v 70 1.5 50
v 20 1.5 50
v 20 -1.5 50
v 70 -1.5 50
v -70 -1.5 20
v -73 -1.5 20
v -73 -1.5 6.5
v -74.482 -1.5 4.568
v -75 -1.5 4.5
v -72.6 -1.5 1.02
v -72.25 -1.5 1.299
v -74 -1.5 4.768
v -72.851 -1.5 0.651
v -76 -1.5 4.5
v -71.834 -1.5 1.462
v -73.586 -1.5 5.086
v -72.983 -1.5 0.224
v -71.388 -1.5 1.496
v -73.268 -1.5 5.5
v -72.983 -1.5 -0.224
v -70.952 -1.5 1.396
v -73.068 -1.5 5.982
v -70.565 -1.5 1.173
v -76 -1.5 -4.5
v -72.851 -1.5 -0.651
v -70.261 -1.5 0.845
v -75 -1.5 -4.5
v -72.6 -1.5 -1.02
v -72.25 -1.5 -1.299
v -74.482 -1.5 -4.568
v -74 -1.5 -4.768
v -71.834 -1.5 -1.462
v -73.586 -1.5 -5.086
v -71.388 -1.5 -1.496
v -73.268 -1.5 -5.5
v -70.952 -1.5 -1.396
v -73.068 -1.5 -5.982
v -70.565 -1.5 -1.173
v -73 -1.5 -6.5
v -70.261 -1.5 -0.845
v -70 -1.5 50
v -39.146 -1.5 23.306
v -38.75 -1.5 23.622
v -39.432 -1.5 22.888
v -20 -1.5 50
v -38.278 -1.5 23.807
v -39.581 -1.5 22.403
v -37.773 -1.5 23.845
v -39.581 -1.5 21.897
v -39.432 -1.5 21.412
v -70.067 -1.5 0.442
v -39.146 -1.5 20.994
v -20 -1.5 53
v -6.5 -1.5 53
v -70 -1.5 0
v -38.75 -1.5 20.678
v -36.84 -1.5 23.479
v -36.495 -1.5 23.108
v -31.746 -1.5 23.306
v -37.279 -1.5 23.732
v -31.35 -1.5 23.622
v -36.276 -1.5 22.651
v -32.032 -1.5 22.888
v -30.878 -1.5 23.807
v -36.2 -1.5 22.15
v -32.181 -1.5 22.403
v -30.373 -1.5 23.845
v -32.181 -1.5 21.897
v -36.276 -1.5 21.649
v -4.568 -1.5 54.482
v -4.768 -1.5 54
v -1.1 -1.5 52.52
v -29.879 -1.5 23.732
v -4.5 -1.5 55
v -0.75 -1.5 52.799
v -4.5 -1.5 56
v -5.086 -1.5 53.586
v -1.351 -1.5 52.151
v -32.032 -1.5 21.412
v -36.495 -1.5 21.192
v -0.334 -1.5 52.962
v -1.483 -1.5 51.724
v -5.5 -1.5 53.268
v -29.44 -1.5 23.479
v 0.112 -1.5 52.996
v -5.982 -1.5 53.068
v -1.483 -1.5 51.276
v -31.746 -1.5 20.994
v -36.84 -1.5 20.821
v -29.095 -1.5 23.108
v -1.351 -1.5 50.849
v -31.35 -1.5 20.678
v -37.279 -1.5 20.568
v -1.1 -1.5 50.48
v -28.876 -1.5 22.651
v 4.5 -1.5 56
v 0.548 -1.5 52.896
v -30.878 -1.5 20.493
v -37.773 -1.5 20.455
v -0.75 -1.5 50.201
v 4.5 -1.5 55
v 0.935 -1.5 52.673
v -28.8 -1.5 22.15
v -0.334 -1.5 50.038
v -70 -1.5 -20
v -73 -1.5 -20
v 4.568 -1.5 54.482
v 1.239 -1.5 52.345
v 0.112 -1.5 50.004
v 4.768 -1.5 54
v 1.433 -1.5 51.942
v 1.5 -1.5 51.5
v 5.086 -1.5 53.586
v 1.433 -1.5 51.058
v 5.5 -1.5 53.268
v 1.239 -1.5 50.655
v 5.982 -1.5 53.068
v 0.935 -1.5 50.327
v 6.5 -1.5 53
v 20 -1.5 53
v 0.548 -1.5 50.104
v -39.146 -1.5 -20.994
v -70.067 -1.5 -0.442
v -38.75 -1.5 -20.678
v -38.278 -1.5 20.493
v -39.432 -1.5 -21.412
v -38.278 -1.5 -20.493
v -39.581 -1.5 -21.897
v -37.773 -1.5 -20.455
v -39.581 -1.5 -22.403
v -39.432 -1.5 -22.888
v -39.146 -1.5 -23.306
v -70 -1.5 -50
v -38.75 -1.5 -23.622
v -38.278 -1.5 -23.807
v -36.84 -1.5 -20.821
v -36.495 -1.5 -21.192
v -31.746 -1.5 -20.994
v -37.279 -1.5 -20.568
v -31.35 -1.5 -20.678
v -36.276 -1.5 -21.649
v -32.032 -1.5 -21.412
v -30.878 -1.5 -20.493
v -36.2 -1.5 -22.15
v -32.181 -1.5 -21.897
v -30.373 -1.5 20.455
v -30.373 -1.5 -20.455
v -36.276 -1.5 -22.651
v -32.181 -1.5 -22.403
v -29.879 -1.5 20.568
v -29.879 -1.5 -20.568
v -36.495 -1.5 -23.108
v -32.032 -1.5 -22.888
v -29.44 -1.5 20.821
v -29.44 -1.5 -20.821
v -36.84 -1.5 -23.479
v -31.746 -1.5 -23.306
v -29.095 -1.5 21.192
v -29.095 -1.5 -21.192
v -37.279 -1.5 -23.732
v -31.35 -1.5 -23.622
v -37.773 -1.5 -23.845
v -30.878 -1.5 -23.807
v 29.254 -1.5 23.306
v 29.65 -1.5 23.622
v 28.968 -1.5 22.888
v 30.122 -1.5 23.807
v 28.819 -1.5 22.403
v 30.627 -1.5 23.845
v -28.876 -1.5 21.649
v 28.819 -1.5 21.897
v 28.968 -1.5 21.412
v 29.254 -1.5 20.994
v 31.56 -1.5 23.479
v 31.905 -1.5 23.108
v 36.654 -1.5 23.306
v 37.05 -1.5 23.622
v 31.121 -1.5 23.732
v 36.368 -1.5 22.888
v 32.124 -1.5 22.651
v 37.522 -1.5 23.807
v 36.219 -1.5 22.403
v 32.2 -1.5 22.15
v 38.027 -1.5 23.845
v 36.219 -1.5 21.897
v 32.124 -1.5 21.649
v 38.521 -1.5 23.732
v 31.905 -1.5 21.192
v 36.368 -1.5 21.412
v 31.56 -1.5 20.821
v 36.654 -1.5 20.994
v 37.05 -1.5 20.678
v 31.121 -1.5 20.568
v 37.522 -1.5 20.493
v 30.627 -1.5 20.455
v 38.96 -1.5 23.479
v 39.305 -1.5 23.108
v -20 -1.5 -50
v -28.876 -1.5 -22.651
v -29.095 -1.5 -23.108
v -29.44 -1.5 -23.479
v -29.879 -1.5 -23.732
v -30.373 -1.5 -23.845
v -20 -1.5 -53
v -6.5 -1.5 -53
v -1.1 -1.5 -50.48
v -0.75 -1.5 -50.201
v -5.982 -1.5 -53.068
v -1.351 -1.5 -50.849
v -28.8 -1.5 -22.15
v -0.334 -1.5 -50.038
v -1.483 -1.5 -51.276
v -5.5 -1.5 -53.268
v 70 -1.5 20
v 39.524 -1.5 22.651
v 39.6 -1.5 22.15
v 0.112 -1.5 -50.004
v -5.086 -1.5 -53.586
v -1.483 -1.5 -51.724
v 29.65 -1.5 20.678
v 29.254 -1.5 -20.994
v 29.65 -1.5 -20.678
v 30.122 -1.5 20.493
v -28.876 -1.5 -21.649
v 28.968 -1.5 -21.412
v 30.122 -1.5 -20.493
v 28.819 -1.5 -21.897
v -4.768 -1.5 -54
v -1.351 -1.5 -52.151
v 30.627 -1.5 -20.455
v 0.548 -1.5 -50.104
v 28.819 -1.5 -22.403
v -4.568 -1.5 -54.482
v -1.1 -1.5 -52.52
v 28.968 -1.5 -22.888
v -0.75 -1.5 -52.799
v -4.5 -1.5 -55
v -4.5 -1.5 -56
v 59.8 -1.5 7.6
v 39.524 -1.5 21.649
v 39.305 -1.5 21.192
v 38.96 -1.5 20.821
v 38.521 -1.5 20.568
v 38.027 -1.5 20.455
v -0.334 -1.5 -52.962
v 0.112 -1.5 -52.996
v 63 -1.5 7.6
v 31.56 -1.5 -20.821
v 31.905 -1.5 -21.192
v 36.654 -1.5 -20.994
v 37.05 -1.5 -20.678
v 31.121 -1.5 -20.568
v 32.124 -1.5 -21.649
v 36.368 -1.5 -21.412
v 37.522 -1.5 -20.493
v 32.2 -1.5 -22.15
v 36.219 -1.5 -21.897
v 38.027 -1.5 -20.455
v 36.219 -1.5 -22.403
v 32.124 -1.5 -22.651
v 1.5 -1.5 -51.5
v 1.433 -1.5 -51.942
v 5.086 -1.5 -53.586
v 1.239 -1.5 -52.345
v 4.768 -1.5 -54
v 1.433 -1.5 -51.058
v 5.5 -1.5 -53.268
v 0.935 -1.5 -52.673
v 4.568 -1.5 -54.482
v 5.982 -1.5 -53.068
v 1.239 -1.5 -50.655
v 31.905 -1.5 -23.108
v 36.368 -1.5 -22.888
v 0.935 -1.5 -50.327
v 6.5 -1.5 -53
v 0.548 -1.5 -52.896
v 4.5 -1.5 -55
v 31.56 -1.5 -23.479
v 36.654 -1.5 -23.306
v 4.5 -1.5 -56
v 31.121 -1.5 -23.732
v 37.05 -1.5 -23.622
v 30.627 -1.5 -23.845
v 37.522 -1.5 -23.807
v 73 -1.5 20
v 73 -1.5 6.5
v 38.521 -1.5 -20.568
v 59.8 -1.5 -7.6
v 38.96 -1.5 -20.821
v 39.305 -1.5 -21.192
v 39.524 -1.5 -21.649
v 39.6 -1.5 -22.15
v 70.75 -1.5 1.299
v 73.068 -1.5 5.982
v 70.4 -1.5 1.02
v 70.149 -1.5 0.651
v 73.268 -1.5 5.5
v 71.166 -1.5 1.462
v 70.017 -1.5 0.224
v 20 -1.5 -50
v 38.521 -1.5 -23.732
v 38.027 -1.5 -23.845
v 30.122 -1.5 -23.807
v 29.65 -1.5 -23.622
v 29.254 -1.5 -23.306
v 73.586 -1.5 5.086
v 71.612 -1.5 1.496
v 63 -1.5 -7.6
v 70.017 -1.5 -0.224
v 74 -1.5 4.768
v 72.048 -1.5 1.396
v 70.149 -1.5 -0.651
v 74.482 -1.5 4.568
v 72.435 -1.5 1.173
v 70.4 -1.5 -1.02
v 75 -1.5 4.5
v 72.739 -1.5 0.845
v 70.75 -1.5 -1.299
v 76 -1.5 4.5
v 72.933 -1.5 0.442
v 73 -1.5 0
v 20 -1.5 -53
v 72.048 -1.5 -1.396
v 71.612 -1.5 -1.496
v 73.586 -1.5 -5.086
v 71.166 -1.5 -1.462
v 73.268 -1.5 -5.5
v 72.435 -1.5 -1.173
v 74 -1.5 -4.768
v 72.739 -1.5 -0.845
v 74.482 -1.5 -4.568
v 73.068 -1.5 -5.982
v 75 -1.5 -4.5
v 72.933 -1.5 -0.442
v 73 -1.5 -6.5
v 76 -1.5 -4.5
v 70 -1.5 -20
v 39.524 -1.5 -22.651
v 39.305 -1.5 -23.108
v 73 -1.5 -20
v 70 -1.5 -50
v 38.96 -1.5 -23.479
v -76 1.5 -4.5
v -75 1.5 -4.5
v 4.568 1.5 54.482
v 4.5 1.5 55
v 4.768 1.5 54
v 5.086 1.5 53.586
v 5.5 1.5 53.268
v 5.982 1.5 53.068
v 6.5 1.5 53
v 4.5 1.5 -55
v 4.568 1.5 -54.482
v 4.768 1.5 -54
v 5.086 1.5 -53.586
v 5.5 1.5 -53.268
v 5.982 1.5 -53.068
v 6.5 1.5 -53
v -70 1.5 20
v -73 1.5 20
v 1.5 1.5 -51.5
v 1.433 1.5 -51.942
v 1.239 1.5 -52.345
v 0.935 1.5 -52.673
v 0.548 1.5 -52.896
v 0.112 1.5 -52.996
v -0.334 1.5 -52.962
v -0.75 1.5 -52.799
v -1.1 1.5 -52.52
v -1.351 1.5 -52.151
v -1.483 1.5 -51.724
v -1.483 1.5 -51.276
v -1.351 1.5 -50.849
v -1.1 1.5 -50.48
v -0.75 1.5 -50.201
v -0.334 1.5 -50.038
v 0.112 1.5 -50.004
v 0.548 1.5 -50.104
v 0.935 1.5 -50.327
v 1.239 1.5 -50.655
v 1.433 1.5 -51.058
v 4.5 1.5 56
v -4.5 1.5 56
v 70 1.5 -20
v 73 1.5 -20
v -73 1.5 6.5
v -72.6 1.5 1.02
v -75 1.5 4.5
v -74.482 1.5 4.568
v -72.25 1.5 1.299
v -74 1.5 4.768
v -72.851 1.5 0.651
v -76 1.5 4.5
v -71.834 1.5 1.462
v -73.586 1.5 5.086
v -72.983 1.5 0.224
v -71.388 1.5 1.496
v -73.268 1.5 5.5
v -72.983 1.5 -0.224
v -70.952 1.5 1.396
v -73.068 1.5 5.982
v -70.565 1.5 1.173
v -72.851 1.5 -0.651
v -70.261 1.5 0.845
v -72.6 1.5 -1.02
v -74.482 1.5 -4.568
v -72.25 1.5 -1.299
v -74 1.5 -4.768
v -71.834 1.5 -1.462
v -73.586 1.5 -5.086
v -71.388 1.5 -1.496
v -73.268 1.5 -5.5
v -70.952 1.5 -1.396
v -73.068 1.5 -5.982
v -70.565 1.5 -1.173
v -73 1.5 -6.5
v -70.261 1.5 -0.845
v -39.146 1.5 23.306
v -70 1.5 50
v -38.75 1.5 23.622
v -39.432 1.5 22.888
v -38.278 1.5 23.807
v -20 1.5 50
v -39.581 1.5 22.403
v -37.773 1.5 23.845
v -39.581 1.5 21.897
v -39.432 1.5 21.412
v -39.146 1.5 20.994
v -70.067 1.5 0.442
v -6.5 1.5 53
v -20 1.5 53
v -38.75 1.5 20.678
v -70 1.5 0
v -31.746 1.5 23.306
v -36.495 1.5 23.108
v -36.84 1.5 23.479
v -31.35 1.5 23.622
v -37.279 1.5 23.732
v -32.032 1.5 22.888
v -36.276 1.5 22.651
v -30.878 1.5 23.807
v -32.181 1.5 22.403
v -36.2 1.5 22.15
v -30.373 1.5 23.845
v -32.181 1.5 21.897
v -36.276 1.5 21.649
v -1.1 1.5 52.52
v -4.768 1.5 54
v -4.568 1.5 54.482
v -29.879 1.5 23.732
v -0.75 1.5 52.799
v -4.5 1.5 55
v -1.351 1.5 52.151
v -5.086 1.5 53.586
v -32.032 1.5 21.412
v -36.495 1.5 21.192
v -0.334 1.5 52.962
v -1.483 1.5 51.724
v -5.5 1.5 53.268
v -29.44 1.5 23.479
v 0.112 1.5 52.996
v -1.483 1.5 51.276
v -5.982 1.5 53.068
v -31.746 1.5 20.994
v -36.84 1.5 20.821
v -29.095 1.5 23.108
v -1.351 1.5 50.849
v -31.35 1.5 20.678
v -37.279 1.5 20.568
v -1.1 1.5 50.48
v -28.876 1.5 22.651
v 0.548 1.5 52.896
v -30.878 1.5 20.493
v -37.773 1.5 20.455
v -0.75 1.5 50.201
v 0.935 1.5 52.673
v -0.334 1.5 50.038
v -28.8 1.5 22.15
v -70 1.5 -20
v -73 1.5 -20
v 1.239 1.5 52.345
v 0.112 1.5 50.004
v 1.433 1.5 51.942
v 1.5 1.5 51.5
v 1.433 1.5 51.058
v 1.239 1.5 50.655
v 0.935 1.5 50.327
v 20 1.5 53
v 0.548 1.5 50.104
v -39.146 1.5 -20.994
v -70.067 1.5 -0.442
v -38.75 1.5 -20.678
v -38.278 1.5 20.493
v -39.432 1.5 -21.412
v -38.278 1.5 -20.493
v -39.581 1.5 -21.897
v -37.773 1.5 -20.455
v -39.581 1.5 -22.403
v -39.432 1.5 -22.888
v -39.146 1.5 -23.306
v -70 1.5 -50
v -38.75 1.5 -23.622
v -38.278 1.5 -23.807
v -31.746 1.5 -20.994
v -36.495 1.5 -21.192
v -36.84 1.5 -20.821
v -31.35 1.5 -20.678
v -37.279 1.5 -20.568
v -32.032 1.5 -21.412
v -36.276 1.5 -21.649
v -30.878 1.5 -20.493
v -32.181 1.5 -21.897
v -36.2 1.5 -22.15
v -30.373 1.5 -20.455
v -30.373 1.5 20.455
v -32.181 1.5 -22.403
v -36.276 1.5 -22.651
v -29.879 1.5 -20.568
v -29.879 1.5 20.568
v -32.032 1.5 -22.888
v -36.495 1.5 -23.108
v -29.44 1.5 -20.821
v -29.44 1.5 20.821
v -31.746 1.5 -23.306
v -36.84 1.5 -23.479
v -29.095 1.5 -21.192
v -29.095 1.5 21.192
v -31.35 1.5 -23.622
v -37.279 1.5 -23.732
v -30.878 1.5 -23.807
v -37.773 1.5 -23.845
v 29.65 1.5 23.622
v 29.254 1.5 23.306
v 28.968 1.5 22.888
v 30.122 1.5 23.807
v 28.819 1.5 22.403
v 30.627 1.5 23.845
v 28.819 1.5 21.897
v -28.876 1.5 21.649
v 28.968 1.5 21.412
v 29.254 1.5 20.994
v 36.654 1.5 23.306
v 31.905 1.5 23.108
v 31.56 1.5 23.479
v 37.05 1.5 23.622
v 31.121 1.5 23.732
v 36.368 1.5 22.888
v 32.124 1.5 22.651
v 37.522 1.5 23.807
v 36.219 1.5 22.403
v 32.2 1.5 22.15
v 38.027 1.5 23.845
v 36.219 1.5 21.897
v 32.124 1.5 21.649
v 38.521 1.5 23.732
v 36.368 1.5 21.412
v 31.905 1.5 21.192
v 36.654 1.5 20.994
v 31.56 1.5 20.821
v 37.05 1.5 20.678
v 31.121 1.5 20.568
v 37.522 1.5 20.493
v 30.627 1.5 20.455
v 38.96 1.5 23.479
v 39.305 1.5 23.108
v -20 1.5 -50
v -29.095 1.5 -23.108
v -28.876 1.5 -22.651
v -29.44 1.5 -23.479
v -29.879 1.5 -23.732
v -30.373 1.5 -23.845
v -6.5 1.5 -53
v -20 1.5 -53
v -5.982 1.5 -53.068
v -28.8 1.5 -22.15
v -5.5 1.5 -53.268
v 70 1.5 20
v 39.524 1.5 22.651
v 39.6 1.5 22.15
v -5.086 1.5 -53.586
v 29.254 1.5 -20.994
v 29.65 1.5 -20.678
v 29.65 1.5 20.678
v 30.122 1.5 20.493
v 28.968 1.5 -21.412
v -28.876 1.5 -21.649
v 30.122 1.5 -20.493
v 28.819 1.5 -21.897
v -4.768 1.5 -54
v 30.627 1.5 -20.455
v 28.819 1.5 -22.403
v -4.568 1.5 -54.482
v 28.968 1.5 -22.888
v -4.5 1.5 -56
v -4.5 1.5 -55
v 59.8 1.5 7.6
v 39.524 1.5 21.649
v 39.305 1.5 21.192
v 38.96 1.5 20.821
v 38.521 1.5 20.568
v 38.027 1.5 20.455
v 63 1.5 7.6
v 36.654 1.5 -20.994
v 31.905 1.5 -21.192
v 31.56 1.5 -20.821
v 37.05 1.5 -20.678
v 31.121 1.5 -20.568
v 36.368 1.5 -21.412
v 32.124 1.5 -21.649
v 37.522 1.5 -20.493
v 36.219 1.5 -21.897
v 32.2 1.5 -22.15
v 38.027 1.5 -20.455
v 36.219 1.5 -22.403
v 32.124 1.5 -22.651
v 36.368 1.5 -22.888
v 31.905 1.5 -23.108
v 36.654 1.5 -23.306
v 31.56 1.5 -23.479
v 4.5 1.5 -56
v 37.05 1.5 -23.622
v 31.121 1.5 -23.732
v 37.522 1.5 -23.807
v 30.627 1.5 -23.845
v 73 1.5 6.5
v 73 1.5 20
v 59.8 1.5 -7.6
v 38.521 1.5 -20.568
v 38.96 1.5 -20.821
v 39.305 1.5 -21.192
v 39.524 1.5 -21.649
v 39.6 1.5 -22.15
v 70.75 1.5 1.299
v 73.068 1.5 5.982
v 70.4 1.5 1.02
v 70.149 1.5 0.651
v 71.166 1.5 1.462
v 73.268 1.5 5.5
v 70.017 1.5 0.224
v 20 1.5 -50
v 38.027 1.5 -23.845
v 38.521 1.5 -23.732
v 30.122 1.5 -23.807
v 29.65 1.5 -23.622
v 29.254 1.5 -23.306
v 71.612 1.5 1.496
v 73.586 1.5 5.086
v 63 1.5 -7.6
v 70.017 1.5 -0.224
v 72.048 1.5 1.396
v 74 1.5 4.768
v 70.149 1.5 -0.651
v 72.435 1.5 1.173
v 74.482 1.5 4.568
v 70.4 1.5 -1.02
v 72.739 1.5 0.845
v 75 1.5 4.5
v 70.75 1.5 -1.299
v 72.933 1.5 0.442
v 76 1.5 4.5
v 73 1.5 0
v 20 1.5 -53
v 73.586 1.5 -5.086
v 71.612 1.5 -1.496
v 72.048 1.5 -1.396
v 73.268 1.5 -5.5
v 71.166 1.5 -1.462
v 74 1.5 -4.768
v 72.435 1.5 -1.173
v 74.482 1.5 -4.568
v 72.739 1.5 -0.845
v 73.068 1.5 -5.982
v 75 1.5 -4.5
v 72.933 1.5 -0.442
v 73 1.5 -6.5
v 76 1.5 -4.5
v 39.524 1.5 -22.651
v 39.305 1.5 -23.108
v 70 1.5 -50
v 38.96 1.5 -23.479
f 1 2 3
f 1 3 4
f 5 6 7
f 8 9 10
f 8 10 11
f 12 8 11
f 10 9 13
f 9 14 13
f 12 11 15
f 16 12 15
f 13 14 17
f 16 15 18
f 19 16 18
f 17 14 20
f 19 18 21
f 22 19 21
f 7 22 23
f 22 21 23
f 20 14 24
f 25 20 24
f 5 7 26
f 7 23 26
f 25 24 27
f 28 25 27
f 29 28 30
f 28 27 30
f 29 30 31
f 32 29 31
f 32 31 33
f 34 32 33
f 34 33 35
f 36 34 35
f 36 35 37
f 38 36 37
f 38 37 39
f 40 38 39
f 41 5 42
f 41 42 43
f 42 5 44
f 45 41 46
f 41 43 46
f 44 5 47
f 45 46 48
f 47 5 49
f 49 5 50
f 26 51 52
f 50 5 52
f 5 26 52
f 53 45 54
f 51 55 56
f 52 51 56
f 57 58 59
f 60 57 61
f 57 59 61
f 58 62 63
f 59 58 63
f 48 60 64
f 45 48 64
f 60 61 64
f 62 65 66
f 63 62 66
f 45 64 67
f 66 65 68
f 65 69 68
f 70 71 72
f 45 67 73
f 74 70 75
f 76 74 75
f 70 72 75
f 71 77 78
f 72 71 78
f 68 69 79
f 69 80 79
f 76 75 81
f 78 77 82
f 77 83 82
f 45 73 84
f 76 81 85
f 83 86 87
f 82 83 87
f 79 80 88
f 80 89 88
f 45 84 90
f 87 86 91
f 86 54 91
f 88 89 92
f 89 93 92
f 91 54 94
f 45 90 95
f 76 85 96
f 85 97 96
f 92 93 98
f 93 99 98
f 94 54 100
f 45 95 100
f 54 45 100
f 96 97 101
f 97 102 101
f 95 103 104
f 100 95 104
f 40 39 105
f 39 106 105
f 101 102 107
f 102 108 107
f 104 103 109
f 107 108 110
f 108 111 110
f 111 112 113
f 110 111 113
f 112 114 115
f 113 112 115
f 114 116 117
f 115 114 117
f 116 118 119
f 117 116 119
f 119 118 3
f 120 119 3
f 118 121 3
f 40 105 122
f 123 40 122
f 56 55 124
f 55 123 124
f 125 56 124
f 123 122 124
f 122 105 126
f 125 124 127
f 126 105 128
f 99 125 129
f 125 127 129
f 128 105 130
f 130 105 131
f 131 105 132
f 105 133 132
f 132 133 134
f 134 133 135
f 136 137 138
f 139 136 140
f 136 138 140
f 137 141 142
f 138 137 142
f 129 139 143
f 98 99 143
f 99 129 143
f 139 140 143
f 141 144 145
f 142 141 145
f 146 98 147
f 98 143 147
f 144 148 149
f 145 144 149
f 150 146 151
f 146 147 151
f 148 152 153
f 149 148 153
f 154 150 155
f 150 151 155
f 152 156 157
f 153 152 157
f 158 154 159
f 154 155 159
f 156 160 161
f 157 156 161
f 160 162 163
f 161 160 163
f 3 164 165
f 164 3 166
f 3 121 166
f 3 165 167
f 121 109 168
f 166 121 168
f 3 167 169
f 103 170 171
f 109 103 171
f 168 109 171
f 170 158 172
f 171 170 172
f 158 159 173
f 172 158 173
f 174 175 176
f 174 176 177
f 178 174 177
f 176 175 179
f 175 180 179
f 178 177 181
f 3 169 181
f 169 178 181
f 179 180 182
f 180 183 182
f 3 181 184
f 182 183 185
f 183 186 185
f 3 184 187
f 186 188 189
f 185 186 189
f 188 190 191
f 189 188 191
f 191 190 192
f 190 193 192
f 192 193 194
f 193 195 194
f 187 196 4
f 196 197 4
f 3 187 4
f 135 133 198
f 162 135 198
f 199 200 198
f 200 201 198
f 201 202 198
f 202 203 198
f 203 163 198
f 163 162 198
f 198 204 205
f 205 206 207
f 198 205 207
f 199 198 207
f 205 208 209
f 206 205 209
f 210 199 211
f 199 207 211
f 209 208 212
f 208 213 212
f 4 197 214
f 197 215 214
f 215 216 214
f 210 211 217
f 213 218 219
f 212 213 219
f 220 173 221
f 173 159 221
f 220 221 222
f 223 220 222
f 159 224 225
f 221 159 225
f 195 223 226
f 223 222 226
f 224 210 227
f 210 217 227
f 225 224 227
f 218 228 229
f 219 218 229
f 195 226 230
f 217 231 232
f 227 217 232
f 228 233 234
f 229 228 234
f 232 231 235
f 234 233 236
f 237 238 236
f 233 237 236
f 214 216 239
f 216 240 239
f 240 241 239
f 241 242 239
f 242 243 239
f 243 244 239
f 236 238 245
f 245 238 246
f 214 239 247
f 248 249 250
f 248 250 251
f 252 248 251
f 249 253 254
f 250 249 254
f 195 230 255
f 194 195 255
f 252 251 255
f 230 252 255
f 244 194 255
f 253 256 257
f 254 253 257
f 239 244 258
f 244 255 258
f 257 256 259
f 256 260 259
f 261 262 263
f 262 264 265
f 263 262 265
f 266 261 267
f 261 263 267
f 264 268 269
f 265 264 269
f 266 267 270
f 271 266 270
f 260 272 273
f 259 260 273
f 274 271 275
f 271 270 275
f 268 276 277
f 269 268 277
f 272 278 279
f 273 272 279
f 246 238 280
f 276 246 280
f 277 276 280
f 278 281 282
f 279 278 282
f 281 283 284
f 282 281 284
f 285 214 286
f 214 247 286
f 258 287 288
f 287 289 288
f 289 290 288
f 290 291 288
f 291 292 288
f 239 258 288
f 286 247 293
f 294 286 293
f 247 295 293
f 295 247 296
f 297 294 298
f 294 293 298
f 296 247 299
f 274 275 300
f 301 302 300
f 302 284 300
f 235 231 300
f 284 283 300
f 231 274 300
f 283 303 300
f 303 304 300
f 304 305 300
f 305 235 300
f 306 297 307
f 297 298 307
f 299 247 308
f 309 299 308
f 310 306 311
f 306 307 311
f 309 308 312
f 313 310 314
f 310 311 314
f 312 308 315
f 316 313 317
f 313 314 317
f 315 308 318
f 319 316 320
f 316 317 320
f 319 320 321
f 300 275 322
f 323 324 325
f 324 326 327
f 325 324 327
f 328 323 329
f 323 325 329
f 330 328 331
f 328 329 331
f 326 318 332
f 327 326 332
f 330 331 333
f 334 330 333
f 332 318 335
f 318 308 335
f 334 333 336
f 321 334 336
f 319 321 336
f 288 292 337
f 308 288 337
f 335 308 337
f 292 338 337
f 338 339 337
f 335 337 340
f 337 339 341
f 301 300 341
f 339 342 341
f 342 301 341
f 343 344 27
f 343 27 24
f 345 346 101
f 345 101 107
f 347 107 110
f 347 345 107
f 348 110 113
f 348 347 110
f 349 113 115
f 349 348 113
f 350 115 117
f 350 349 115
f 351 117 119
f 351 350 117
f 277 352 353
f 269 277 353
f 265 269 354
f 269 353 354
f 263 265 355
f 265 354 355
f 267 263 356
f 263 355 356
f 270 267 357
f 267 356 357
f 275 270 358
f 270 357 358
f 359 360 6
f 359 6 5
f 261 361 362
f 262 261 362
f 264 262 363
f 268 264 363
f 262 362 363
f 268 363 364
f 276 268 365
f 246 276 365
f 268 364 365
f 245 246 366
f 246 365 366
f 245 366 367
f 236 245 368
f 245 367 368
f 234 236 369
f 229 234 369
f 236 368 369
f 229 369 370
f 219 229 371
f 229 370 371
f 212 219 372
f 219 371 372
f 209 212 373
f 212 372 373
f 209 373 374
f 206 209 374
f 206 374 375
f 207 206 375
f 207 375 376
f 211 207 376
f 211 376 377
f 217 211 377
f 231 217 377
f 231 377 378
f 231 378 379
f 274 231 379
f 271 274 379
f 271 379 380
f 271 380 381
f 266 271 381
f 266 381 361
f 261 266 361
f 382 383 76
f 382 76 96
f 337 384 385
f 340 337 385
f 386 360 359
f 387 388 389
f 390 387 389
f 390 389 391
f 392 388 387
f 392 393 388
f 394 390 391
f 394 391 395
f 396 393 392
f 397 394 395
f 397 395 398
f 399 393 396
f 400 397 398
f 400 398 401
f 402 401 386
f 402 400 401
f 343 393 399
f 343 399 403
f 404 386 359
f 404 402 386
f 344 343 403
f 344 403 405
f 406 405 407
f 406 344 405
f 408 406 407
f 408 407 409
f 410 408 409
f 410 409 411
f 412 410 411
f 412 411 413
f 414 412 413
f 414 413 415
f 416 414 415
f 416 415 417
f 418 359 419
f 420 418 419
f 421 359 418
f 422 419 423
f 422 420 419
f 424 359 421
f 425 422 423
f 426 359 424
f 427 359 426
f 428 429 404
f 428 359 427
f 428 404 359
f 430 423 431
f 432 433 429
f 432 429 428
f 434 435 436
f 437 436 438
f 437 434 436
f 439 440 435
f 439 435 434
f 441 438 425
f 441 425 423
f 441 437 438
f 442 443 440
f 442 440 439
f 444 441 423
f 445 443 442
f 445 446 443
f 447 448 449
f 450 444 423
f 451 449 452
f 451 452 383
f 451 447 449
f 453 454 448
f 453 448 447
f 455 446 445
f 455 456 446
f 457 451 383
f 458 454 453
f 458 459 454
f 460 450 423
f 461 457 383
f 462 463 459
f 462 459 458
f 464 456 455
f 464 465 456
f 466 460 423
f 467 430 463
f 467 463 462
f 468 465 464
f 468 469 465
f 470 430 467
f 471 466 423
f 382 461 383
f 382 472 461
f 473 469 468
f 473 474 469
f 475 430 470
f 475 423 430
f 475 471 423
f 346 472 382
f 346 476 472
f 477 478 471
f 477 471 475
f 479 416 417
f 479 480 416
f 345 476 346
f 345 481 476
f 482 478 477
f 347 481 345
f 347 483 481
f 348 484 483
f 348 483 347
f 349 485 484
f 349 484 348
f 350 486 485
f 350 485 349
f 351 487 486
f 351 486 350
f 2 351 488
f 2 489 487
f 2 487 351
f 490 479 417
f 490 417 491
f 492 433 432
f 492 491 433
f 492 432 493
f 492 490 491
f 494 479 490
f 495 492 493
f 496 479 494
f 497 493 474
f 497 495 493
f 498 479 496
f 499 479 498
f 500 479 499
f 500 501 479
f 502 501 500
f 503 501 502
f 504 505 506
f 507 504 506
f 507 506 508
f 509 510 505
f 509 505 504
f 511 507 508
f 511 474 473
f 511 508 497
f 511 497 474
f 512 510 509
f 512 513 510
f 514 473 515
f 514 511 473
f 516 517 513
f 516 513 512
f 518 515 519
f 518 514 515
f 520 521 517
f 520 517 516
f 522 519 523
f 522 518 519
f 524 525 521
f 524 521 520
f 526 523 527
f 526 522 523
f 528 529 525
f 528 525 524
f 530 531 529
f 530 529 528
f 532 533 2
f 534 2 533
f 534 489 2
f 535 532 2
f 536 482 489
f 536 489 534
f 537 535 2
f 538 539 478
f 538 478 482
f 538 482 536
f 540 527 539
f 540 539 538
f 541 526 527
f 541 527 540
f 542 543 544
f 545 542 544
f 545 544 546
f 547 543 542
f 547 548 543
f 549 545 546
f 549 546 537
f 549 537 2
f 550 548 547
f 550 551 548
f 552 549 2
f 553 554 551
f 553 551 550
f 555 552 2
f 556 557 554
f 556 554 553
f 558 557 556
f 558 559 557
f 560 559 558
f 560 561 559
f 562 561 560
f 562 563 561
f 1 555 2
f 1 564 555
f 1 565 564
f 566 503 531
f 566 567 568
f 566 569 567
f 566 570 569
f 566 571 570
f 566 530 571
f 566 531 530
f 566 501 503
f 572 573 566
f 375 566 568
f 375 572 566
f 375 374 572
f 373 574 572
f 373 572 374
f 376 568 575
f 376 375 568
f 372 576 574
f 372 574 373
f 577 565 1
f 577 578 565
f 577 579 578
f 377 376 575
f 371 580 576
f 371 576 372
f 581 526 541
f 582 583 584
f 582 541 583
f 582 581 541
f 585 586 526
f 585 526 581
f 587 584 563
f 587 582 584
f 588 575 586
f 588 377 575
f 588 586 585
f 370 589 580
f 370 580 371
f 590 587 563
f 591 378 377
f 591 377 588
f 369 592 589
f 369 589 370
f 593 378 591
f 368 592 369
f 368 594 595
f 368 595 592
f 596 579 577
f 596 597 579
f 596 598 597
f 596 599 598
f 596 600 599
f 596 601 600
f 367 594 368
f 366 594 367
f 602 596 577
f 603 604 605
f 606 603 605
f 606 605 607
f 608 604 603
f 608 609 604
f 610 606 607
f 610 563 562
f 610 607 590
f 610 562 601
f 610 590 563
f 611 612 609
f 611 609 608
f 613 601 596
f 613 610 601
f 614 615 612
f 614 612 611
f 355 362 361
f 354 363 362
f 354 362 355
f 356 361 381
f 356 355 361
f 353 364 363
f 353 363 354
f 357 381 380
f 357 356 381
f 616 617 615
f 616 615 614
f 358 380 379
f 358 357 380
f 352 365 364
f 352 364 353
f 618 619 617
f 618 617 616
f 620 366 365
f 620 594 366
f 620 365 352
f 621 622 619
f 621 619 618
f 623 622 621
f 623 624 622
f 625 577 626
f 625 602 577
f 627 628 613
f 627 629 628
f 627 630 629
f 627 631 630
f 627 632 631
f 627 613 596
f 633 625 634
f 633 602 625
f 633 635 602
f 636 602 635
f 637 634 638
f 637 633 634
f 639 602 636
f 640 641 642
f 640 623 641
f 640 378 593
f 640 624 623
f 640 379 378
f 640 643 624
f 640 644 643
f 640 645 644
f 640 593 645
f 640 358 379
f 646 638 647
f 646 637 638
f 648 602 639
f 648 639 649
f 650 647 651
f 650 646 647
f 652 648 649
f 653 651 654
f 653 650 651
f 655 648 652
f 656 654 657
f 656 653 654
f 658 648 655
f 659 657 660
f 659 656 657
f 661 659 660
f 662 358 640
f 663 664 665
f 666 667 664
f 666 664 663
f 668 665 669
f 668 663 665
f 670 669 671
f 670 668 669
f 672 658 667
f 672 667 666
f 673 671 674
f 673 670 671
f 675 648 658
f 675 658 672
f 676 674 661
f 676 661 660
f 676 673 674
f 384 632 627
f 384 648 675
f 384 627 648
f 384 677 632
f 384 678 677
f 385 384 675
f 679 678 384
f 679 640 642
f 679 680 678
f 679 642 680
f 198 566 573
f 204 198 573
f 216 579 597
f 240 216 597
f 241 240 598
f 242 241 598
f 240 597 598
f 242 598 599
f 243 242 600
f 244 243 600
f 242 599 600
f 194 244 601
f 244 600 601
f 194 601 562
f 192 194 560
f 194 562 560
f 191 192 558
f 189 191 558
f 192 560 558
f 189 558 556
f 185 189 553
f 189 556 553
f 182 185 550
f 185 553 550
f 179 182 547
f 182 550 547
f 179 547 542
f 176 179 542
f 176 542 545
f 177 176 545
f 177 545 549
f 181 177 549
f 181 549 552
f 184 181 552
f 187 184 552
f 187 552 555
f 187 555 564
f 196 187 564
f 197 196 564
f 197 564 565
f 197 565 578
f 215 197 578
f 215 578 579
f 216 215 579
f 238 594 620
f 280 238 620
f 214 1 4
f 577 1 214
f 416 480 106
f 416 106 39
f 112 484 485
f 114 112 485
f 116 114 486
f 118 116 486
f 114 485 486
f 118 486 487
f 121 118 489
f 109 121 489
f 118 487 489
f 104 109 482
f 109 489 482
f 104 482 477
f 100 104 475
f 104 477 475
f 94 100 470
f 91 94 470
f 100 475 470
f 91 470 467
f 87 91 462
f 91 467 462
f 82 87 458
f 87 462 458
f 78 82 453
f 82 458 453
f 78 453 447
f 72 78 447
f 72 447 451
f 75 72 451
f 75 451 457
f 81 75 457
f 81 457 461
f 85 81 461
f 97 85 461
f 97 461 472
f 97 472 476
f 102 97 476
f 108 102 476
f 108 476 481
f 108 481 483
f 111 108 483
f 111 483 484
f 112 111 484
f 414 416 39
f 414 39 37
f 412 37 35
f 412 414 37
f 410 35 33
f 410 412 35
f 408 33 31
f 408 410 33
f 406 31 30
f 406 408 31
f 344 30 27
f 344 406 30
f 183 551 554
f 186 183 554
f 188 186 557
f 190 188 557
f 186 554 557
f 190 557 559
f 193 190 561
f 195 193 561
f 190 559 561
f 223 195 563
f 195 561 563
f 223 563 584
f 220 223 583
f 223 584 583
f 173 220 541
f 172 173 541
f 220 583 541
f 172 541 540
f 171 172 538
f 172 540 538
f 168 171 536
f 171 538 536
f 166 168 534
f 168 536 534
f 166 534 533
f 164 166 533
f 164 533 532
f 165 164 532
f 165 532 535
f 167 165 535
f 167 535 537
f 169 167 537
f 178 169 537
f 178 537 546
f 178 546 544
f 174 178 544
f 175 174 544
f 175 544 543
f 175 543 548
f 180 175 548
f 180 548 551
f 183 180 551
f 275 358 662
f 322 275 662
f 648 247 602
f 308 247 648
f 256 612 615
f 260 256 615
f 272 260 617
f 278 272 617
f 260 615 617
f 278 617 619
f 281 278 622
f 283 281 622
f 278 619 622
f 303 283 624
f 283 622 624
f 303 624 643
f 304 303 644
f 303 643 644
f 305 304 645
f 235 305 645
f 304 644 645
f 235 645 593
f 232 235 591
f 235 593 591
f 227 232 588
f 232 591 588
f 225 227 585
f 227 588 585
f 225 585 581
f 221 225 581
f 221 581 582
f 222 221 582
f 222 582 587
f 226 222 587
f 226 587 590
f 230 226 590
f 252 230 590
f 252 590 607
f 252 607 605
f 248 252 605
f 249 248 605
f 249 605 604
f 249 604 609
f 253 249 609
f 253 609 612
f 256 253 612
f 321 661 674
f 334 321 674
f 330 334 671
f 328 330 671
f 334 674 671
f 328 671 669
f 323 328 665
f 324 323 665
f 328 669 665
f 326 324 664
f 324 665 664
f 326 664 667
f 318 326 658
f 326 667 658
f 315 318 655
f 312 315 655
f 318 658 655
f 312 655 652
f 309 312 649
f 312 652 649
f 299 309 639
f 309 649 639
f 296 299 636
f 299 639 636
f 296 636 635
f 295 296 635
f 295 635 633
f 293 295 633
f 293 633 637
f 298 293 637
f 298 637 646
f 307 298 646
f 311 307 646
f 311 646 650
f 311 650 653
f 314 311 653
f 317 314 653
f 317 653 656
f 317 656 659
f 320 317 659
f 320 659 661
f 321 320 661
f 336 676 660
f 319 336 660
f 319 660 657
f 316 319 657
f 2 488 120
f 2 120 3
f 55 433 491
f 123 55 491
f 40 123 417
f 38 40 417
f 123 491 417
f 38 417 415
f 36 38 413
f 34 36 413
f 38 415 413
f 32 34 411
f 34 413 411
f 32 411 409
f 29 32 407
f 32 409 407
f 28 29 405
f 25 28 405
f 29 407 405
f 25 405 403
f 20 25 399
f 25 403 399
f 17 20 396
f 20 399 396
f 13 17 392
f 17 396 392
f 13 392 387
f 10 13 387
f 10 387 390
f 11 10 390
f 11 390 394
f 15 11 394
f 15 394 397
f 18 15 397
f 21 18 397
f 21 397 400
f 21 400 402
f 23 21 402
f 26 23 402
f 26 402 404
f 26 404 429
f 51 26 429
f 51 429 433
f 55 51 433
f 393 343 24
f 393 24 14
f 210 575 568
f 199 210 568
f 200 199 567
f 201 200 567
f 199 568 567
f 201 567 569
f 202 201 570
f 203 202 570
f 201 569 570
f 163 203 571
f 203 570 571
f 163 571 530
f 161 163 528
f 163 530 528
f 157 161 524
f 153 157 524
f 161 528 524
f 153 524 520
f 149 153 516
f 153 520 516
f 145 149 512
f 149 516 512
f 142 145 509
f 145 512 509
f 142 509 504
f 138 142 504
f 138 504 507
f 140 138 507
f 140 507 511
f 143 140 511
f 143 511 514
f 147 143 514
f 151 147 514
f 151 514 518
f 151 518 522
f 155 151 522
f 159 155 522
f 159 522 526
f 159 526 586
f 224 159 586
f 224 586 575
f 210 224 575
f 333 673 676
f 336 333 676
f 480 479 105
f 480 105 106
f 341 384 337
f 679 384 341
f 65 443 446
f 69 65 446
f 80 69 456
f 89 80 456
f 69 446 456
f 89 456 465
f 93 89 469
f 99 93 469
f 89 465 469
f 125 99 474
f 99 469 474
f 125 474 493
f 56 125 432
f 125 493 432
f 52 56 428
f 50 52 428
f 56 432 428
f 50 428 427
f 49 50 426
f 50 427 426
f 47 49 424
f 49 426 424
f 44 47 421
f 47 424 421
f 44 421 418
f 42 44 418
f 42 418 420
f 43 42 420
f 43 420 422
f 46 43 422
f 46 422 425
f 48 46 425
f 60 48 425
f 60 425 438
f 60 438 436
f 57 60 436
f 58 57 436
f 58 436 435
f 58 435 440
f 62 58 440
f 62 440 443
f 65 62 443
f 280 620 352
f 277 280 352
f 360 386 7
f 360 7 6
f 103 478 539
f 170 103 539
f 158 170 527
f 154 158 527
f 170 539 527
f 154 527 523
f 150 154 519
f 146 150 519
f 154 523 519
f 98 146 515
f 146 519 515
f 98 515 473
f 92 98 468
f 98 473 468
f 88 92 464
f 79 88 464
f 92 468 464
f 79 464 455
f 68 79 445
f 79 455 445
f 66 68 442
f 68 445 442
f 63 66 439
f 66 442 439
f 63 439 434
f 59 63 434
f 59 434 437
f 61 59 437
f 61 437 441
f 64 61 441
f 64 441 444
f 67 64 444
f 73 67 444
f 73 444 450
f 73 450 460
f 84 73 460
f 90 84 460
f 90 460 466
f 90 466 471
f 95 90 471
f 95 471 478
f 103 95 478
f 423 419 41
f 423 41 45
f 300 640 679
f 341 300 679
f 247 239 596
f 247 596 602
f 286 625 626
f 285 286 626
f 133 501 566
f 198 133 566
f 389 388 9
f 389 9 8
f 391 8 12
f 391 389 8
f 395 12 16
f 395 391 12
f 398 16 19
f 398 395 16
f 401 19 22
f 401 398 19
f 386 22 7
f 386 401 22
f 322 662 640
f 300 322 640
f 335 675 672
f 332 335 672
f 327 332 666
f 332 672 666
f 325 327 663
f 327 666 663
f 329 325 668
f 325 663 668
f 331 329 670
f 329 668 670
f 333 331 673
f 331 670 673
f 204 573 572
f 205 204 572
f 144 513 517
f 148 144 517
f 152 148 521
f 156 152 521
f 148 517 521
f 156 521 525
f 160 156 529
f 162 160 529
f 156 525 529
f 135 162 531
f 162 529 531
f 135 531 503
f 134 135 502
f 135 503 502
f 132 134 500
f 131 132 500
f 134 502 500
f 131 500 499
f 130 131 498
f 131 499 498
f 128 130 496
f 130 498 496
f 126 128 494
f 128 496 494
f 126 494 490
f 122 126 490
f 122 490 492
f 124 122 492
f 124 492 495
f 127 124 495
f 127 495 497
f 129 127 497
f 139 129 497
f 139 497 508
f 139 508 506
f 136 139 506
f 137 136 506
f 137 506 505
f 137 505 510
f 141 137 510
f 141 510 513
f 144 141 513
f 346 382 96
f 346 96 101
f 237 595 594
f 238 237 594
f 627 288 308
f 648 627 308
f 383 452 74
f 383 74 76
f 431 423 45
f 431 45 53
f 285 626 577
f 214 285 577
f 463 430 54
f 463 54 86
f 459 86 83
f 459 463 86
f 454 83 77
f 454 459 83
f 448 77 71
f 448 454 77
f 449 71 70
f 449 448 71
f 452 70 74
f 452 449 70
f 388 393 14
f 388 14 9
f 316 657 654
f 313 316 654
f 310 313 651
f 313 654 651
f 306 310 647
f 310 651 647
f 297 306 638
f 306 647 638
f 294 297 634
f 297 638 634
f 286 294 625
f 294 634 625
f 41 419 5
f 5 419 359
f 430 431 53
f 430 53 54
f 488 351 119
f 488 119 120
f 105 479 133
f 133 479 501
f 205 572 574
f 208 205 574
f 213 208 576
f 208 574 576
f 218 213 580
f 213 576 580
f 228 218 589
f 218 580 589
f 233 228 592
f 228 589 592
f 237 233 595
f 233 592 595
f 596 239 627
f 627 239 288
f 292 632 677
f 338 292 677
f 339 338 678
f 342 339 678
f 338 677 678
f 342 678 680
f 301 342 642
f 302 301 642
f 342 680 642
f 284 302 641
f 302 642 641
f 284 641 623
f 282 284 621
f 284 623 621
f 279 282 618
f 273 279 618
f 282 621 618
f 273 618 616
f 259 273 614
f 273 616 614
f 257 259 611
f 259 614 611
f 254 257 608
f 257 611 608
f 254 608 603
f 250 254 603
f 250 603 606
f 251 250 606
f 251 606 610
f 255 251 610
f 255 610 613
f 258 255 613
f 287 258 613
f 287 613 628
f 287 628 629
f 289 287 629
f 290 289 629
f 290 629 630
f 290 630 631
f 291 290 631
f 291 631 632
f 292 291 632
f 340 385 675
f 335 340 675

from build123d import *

# Parameters (mm, degrees)
ESBO_O1_W                = 140
ESBO_O1_H                = 100
RESSALTO_EXTRUS_O1_DEPTH = 1.5
RESSALTO_EXTRUS_O2_DEPTH = 3
ESBO_O2_R                = 1.5
CORTE_EXTRUS_O1_DEPTH    = 4
SKETCH1_R                = 1.7
CUT_EXTRUDE1_DEPTH       = 1
CUT_EXTRUDE1_DEPTH_BACK  = 4
SKETCH2_W                = 3.2
SKETCH2_H                = 15.2
CUT_EXTRUDE3_DEPTH       = 2.5
CUT_EXTRUDE3_DEPTH_BACK  = 2.5


with BuildPart() as part:
    # Esboço1 → Ressalto-extrusão1 (new body, symmetric)
    with BuildSketch(Plane(origin=(0, 0, 0), x_dir=(1, 0, 0), z_dir=(0, 1, 0))):
        Rectangle(ESBO_O1_W, ESBO_O1_H)
    extrude(amount=RESSALTO_EXTRUS_O1_DEPTH, both=True)

    # Esboço4 → Ressalto-extrusão2 (add, through all)
    with BuildSketch(Plane(origin=(0, 1.5, 0), x_dir=(1, 0, 0), z_dir=(0, 1, 0))):
        with BuildLine():
            Line((6.5, 53), (20, 53))
            Line((20, 53), (20, 50))
            Line((20, 50), (-20, 50))
            Line((-20, 50), (-20, 53))
            Line((-20, 53), (-6.5, 53))
            ThreePointArc((-6.5, 53), (-5.085786438, 53.585786438), (-4.5, 55))
            Line((-4.5, 55), (-4.5, 56))
            Line((-4.5, 56), (4.5, 56))
            Line((4.5, 56), (4.5, 55))
            ThreePointArc((4.5, 55), (5.085786438, 53.585786438), (6.5, 53))
        make_face()
        with BuildLine():
            Line((-76, 4.5), (-76, -4.5))
            Line((-76, -4.5), (-75, -4.5))
            ThreePointArc((-75, -4.5), (-73.585786438, -5.085786438), (-73, -6.5))
            Line((-73, -6.5), (-73, -20))
            Line((-73, -20), (-70, -20))
            Line((-70, -20), (-70, 20))
            Line((-70, 20), (-73, 20))
            Line((-73, 20), (-73, 6.5))
            ThreePointArc((-73, 6.5), (-73.585786438, 5.085786438), (-75, 4.5))
            Line((-75, 4.5), (-76, 4.5))
        make_face()
        with BuildLine():
            Line((4.5, -56), (4.5, -55))
            ThreePointArc((4.5, -55), (5.085786438, -53.585786438), (6.5, -53))
            Line((6.5, -53), (20, -53))
            Line((20, -53), (20, -50))
            Line((20, -50), (-20, -50))
            Line((-20, -50), (-20, -53))
            Line((-20, -53), (-6.5, -53))
            ThreePointArc((-6.5, -53), (-5.085786438, -53.585786438), (-4.5, -55))
            Line((-4.5, -55), (-4.5, -56))
            Line((-4.5, -56), (4.5, -56))
        make_face()
        with BuildLine():
            Line((70, 20), (73, 20))
            Line((73, 20), (73, 6.5))
            ThreePointArc((73, 6.5), (73.585786438, 5.085786438), (75, 4.5))
            Line((75, 4.5), (76, 4.5))
            Line((76, 4.5), (76, -4.5))
            Line((76, -4.5), (75, -4.5))
            ThreePointArc((75, -4.5), (73.585786438, -5.085786438), (73, -6.5))
            Line((73, -6.5), (73, -20))
            Line((73, -20), (70, -20))
            Line((70, -20), (70, 20))
        make_face()
    extrude(amount=-RESSALTO_EXTRUS_O2_DEPTH)

    # Esboço2 → Corte-extrusão1 (cut, through all)
    with BuildSketch(Plane(origin=(0, 1.5, 0), x_dir=(1, 0, 0), z_dir=(0, 1, 0))):
        with Locations((0, -51.5)):
            Circle(ESBO_O2_R)
        with Locations((0, 51.5)):
            Circle(ESBO_O2_R)
        with Locations((71.5, 0)):
            Circle(ESBO_O2_R)
        with Locations((-71.5, 0)):
            Circle(ESBO_O2_R)
    extrude(amount=-CORTE_EXTRUS_O1_DEPTH, mode=Mode.SUBTRACT)

    # Sketch1 → Cut-Extrude1 (cut, two sides)
    with BuildSketch(Plane(origin=(0, 1.5, 0), x_dir=(1, 0, 0), z_dir=(0, 1, 0))) as cut_extrude1_sk:
        with Locations((30.5, -22.15)):
            Circle(SKETCH1_R)
        with Locations((37.9, -22.15)):
            Circle(SKETCH1_R)
        with Locations((37.9, 22.15)):
            Circle(SKETCH1_R)
        with Locations((30.5, 22.15)):
            Circle(SKETCH1_R)
        with Locations((-30.5, 22.15)):
            Circle(SKETCH1_R)
        with Locations((-37.9, 22.15)):
            Circle(SKETCH1_R)
        with Locations((-37.9, -22.15)):
            Circle(SKETCH1_R)
        with Locations((-30.5, -22.15)):
            Circle(SKETCH1_R)
    extrude(amount=CUT_EXTRUDE1_DEPTH, mode=Mode.SUBTRACT)
    extrude(cut_extrude1_sk.sketch, amount=-CUT_EXTRUDE1_DEPTH_BACK, mode=Mode.SUBTRACT)

    # Sketch2 → Cut-Extrude3 (cut, two sides)
    with BuildSketch(Plane(origin=(0, 0, 0), x_dir=(1, 0, 0), z_dir=(0, 1, 0))) as cut_extrude3_sk:
        with Locations((61.4, 0)):
            Rectangle(SKETCH2_W, SKETCH2_H)
    extrude(amount=CUT_EXTRUDE3_DEPTH, mode=Mode.SUBTRACT)
    extrude(cut_extrude3_sk.sketch, amount=-CUT_EXTRUDE3_DEPTH_BACK, mode=Mode.SUBTRACT)


solid = part.part
